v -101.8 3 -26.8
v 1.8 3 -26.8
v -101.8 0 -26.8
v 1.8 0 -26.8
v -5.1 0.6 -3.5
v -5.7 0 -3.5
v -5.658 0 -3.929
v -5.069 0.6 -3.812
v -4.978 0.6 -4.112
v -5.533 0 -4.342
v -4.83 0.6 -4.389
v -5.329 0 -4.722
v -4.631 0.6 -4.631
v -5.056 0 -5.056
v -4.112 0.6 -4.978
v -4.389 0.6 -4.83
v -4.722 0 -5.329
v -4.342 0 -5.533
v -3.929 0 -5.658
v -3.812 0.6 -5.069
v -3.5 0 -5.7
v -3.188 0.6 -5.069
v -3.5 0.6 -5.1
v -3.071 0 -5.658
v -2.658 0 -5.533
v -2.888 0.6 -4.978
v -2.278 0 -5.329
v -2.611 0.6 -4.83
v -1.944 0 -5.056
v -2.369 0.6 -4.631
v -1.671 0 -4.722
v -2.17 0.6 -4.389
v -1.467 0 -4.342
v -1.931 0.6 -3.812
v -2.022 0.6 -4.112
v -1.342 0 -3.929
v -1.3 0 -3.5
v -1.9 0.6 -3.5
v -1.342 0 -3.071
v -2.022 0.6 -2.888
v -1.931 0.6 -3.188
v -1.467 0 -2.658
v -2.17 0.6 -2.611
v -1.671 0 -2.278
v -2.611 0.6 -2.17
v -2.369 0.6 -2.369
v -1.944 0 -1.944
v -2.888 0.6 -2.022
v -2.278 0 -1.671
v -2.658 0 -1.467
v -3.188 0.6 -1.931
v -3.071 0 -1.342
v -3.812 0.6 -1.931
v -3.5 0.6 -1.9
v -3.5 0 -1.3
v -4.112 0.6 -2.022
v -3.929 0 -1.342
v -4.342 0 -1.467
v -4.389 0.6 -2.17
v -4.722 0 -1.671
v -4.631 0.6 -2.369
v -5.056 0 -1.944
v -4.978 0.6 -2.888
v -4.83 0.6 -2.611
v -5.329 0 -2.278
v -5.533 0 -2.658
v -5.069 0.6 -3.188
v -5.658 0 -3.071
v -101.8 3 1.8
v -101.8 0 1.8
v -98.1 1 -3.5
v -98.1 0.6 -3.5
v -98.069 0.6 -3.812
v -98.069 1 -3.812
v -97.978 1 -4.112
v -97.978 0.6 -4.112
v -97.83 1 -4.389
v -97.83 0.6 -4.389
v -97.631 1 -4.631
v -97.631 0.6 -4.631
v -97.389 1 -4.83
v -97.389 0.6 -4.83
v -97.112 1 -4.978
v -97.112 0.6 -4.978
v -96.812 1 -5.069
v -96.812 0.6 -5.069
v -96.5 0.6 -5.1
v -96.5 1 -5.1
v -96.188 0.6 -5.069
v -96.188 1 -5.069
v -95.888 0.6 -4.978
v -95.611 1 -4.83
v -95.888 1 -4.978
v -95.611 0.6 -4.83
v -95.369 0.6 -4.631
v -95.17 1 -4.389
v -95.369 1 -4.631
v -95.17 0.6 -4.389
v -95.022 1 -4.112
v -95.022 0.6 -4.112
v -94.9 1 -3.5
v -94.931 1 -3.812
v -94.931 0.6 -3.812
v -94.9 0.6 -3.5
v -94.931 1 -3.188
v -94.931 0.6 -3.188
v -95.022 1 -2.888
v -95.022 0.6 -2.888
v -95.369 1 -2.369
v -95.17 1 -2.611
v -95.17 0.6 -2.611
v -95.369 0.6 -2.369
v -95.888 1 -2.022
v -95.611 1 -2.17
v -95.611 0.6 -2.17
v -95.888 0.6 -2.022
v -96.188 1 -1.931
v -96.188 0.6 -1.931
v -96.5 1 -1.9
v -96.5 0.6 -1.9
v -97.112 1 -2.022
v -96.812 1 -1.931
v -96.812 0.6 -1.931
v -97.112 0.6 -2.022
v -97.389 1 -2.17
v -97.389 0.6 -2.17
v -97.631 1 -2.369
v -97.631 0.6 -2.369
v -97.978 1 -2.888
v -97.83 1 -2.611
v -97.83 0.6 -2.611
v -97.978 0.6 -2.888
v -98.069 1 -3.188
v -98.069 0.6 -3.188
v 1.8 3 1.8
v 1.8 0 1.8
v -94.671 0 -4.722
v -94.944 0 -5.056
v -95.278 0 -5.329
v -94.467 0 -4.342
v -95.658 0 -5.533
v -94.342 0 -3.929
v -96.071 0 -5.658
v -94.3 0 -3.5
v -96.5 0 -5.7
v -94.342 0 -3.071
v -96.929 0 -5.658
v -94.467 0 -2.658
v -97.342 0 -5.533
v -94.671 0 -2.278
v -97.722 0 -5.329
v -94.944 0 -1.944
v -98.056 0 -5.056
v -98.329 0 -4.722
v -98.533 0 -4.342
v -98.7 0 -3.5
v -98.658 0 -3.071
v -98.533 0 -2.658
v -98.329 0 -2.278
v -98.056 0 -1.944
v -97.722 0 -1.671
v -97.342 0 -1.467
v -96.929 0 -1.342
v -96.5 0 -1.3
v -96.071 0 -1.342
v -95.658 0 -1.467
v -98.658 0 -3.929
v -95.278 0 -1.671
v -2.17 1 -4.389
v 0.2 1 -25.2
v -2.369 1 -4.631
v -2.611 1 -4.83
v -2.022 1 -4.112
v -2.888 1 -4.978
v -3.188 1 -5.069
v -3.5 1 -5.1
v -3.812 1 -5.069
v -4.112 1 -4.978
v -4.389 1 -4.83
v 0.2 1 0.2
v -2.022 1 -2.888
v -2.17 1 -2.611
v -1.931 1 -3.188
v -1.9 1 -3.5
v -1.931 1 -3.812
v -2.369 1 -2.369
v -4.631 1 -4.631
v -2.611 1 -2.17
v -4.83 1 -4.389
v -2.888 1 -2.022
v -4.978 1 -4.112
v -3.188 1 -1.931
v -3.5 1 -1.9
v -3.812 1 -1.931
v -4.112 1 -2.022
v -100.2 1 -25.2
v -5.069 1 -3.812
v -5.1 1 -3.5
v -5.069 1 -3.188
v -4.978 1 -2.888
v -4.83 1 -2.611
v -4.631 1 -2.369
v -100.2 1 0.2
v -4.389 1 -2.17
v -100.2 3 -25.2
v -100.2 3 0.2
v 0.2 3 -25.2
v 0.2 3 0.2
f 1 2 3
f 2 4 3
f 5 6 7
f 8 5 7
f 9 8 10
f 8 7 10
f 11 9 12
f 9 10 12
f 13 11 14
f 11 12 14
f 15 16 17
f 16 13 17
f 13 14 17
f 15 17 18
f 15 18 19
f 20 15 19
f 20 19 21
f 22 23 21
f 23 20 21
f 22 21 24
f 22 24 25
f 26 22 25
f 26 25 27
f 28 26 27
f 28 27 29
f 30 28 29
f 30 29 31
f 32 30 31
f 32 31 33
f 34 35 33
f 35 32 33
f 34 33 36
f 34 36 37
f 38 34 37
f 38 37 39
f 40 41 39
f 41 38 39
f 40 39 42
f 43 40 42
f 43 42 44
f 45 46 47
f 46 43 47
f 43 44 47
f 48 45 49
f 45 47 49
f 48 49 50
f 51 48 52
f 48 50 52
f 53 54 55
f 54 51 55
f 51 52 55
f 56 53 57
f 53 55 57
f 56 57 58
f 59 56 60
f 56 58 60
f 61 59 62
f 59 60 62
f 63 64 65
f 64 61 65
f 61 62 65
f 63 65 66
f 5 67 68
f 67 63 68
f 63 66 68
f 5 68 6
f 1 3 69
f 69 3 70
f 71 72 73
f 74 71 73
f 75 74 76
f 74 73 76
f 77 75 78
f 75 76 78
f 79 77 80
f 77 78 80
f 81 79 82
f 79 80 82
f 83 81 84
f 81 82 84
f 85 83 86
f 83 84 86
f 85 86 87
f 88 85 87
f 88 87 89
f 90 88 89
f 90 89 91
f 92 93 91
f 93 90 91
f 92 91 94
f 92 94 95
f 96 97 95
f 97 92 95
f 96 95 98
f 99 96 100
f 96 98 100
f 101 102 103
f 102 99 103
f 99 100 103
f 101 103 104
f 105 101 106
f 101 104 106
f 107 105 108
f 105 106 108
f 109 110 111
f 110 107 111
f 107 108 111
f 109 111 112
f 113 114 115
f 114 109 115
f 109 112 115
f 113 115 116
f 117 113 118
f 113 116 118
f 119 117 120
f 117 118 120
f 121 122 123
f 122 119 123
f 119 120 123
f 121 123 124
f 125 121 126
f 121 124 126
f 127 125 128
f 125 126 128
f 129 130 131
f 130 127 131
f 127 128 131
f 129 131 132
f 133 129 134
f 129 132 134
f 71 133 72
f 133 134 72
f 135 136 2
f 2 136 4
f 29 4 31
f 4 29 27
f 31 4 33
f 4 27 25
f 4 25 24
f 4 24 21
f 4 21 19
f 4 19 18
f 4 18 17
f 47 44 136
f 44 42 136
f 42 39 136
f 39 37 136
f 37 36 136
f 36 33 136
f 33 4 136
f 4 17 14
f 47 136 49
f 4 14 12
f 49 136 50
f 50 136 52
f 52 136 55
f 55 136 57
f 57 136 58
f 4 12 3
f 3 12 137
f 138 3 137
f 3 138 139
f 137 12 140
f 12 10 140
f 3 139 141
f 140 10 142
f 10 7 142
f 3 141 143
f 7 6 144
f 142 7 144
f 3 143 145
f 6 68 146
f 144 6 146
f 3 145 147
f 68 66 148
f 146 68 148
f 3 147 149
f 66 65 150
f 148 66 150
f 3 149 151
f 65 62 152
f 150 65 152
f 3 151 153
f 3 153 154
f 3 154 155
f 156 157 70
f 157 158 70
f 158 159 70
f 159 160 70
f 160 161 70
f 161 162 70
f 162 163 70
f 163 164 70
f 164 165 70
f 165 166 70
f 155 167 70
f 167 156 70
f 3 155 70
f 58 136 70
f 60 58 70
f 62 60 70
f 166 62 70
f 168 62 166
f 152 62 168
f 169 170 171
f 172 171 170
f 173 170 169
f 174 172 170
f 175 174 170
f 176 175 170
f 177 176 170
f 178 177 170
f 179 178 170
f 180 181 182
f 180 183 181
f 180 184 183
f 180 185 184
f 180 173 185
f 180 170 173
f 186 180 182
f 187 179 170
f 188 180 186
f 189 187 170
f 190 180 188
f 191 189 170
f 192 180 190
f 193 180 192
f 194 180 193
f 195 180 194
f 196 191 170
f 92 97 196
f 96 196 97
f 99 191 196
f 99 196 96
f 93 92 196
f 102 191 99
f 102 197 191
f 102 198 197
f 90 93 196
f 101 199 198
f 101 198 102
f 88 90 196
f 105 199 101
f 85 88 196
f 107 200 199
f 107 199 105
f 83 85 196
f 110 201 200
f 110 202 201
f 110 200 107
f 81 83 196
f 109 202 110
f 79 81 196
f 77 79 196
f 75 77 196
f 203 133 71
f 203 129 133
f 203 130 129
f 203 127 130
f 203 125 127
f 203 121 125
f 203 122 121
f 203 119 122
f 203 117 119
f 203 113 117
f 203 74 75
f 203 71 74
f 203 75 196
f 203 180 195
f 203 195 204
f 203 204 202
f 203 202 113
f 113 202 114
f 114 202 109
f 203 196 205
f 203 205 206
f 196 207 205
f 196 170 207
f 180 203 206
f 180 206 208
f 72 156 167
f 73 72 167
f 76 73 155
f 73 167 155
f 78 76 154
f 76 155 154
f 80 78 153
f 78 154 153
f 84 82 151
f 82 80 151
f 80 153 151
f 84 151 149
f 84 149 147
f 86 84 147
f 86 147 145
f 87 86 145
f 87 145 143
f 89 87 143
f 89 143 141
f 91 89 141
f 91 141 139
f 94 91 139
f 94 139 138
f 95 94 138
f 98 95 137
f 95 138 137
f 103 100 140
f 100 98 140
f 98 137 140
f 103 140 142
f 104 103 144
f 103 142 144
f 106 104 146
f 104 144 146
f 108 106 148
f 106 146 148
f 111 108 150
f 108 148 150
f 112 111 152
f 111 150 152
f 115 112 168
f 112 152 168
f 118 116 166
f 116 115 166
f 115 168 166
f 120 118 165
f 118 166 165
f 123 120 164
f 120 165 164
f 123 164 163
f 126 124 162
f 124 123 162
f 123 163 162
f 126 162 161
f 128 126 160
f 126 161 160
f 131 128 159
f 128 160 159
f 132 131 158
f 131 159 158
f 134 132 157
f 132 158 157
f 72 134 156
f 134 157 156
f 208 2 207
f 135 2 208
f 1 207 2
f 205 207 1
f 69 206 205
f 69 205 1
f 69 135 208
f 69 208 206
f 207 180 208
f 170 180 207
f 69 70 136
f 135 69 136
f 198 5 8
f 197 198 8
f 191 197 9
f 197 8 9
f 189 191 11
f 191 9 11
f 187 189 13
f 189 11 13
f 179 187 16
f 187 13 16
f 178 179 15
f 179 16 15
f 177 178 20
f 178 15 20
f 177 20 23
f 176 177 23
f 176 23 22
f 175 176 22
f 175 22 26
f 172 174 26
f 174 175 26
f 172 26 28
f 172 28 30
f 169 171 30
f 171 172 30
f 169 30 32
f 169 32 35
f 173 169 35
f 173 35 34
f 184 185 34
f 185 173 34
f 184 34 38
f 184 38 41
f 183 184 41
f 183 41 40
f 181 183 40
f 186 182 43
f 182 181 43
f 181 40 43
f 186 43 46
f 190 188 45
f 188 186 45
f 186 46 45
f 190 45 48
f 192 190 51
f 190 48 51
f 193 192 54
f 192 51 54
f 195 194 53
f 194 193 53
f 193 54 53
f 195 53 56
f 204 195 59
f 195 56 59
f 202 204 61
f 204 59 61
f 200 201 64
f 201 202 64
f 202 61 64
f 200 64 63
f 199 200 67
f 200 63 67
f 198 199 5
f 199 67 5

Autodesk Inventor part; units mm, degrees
ref_plane "YZ Plane" through (0, 0, 0) normal (1, 0, 0) x (0, 1, 0)
ref_plane "XZ Plane" through (0, 0, 0) normal (0, 1, 0) x (-1, 0, 0)
ref_plane "XY Plane" through (0, 0, 0) normal (0, 0, 1) x (1, 0, 0)
sketch "Szkic1" plane through (0, 0, 0) normal (0, 1, 0) x (-1, 0, 0)
  circle A0 centre (3.5, -3.5) radius 1.6
  circle A1 centre (96.5, -3.5) radius 1.6
  line L0 (100, 0) -> (100, -25)
  line L1 (100, -25) -> (0, -25)
  line L2 (0, -25) -> (0, 0)
  line L3 (0, 0) -> (100, 0)
  line L4 (100.2, -25.2) -> (100.2, 0.2)
  line L5 (100.2, 0.2) -> (-0.2, 0.2)
  line L6 (-0.2, 0.2) -> (-0.2, -25.2)
  line L7 (-0.2, -25.2) -> (100.2, -25.2)
  line L8 (101.8, -26.8) -> (101.8, 1.8)
  line L9 (101.8, 1.8) -> (-1.8, 1.8)
  line L10 (-1.8, 1.8) -> (-1.8, -26.8)
  line L11 (-1.8, -26.8) -> (101.8, -26.8)
  dimension "d0" = 0.2
  dimension "d1" = 1.6
extrude "Wyciągnięcie proste1" add sketch "Szkic1" along normal blind 1 contours L0 L1 L2 L3 | L7 L6 L5 L4 | L11 L10 L9 L8
extrude "Wyciągnięcie proste2" add sketch "Szkic1" along normal blind 3 contours L11 L10 L9 L8
chamfer "Faza1" distance 0.6 angle 45 2 edges at (-1.9, 0, -3.5) (-94.9, 0, -3.5)
properties part number "forma_noz"
